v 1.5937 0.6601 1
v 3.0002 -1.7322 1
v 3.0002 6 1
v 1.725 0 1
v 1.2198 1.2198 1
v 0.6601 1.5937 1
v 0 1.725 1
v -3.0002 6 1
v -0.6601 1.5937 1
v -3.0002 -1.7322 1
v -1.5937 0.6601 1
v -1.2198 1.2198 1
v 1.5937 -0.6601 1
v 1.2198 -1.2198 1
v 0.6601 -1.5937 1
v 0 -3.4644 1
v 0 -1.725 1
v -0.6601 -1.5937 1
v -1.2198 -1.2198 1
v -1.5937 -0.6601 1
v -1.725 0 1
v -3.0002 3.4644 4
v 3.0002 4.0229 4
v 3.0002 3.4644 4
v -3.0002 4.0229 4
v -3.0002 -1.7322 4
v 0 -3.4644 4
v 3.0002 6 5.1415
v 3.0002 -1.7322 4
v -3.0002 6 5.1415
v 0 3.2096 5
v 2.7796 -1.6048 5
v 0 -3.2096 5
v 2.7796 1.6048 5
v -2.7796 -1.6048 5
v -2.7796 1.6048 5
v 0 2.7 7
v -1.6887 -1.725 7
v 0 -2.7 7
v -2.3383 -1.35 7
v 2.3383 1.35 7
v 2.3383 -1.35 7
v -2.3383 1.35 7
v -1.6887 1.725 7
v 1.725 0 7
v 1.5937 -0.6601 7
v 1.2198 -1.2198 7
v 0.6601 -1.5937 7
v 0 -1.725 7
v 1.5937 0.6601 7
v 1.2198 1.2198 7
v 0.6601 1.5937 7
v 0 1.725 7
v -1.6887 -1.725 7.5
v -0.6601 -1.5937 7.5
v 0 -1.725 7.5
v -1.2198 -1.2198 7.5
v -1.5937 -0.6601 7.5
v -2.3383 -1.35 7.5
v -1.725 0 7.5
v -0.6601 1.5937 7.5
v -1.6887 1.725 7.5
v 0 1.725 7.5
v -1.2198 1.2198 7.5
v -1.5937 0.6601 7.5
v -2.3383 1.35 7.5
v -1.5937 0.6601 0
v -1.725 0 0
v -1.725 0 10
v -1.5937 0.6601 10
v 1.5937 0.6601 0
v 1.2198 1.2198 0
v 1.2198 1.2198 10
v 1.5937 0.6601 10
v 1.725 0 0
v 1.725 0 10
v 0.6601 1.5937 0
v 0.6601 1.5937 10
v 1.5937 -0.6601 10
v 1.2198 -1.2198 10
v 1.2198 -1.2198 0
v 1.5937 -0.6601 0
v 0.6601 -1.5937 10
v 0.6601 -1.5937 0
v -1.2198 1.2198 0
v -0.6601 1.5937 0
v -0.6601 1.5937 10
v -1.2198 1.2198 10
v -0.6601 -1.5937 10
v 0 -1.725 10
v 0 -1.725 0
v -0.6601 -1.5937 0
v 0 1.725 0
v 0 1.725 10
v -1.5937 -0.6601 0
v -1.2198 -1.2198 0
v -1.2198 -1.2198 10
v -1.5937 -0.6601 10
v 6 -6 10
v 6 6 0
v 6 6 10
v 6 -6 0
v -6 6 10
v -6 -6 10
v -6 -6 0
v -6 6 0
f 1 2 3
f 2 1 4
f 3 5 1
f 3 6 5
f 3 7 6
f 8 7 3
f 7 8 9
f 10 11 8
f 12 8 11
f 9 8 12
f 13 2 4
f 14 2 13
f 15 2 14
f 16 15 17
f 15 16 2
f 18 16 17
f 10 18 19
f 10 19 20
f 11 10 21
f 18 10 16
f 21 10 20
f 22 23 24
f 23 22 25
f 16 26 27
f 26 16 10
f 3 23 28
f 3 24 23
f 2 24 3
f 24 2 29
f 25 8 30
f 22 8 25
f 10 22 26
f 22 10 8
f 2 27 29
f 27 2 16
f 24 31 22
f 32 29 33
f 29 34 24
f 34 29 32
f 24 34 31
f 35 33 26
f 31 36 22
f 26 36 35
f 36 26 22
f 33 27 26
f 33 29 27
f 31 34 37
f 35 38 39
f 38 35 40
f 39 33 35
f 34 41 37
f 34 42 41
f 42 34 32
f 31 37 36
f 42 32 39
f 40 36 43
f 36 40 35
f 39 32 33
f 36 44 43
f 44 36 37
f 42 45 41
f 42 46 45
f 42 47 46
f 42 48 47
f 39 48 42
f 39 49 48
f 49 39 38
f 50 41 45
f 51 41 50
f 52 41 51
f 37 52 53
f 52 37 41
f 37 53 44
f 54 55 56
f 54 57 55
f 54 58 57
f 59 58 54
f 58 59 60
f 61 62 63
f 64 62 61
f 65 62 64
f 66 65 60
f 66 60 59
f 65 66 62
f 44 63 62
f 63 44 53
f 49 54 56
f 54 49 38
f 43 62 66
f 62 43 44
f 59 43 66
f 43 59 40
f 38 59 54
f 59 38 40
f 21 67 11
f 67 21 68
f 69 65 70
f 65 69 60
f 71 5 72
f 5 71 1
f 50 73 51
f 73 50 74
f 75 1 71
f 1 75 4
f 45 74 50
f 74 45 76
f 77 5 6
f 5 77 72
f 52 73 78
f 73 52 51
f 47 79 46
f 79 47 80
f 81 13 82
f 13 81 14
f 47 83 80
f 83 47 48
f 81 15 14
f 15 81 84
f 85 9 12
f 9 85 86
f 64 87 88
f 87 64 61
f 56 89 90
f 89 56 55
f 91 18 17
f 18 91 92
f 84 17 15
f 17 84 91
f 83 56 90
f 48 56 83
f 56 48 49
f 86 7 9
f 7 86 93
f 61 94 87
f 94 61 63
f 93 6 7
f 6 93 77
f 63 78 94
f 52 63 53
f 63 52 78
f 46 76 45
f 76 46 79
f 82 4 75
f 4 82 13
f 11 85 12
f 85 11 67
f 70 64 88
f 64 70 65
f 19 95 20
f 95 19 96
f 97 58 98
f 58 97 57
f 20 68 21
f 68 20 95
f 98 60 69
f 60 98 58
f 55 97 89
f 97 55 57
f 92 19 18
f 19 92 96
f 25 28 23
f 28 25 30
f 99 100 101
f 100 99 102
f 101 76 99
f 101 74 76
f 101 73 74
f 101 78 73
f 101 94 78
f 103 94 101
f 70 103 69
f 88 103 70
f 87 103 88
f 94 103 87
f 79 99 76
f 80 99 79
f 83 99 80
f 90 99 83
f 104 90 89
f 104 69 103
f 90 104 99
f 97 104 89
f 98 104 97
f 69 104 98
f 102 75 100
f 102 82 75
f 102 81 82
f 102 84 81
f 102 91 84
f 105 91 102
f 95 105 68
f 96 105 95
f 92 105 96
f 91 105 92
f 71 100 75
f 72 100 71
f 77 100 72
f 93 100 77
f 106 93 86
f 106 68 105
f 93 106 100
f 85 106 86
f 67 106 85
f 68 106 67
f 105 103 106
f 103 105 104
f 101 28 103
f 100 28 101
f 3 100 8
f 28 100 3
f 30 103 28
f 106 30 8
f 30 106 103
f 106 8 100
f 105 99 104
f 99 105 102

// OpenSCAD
// file: ../libs/libdict.scad
// This library add dictionary like features to openscad
// the dictionary is a list of pairs as we cannot define new types.
// Unlike a python dictionary we cannot do a proper hash table for speed
// so everything is build around the OpenSCAD search function
// There are a lot of assert statements to ensure data in the "dictionary"
// is in the format of
// * A list of lists
// * Each internal list has a length of two
// * First element of each internal list is a string (the key)
// * All keys are unique.


// Private function:
// This function returns true if the value is in the list
// value must be a string.
// No error checking, for use by is_in only!
function _is_in_str(value, list) =
    search([value], list) != [[]];

// Private function:
// This function returns true if the value is in the list
// value must be a number.
// No error checking, for use by is_in only!
function _is_in_num(value, list) =
    search(value, list) != [];


// This function returns true if the value is in the list
// value must be a string or a number.
function is_in(value, list) =
    assert(is_num(value) || is_string(value) , "is_in: value must be a number or string")
    assert(is_list(list), "is_in: list must be a list")
    is_num(value) ? _is_in_num(value, list) : _is_in_str(value, list);

/**
 * Sum a list
 * This recursive function sums a list.  It should be called with one
 * argument (the list); the other two arguments simply allow it to be
 * "tail-recursive" which lets OpenSCAD optimise it better.  This is
 * very close to the example given in the OpenSCAD docs.
 */
function _libdict_sum_list(list, starting_element=0, running_total=0) =
    starting_element >= len(list) ?
        running_total :
        _libdict_sum_list(list, starting_element + 1, running_total + list[starting_element]);

/**
 * When checking a list for uniqueness, we can get "errant matches".
 * An errant match is when a non-list matches with the first element in a list.
 * i.e. it would consider [1, [1,0]] to be non-unique. We cannot know which 
 * element is the non-list but we do know that it is errant if exactly one 
 * of them is not a list.
 * If two elements are non-lists, they must be identical in order to have matched.  
 * Similarly, if all elements are lists, they must be identical because ``search`` 
 * will have matched them as whole lists.
 * The argument "list" is the list we are checking for uniqueness, and "match" is 
 * a vector of indices that have been returned by ``search``.
 */
function _check_errant_match(list, match) = let(
    non_list = [for (m = match) is_list(list[m])? 0 : 1],
    number_of_non_lists = _libdict_sum_list(non_list)
) number_of_non_lists == 1 ? 0 : 1;

// Returns true if all emements in list are unique.
function is_unique(list) =
    assert(is_list(list), "is_unique: list must be a list")
    let(
        matches = search(list, list, 0),
        // Assign 1 or 0 depending on is the match length for each element
        // return wether any matches are greater than one (mathcing more than
        // itself)
        // note cannot search for true or false so using 1 and zero
        bool_list = [for (match = matches) if (len(match)==1) 0
            // should put a 1 here to show they matched but in the case of
            // [1, [1]] it will match both, so need to check if they are
            // both lists or both not list
            else _check_errant_match(list, match)]
    ) !is_in(1, bool_list);

// Private function:
// Checks that the input is a list and that every element is a list
// of length 2.
// No error checking, for use by valid_dict only!
function _is_pairs(list) =
    !is_list(list) ? false :
        len(list)==0 ? false :
            !is_in(0, [for (pair = list) is_list(pair) && len(pair)==2 ? 1: 0]);

// Private function:
// Checks all elements in the list are strings
// No error checking, for use by valid_dict only!
// Strings can't be empty
function _is_list_of_strings(list) =
    !is_in(0, [for (item = list) is_string(item) && len(item)>0 ? 1: 0]);

// Private function:
// Returns the keus in a dictionary
// No error checking, for use by valid_dict only!
function _keylist(dict)  = [for (pair=dict) pair[0]];

function valid_dict(dict) =
    //if the input are not pairs return instantly
    !_is_pairs(dict) ? false : let (
        //if they are pairs get all keys
        keys = _keylist(dict),
        all_strings =  _is_list_of_strings(keys),
        unique = is_unique(keys)
    ) (all_strings && unique) ? true : false;

// Key lookup for key value pair "dictionary".
// Unlike the built in lookup this works with strings.
function key_lookup(key, dict) =
    assert(is_string(key), "`key` must be a string")
    assert(valid_dict(dict), "`dict` must be a valid 'dictionary'")
    let(
        // key is in [] because otherwise openscad will search for each letter rather than the string.
        index = search([key], dict, 1, 0)[0]
    )  assert (index!=[], "Key lookup failed, key not found!") dict[index][1];

// Creates a new dictionary with a key value pair replaced. Pair must already
// be in dictionary.
function replace_value(key, value, dict) =
    assert(is_string(key), "`key` must be a string")
    assert(valid_dict(dict), "`dict` must be a valid 'dictionary'")
    assert(is_in(key, _keylist(dict)), "`key` not found in dictionary!")
    [for (kv_pair = dict) key!=kv_pair[0] ? kv_pair : [key, value]];


// Creates a new dictionary with a a set of key value pair replaced
// both inputs must be a dictionary. All keys in input must already be
// in dictionary
function replace_multiple_values(rep_dict, dict) =
    assert(valid_dict(rep_dict), "`rep dict` must be a valid 'dictionary'")
    assert(valid_dict(dict), "`dict` must be a valid 'dictionary'")
    let(
        // loop over all keys in replacement dict checking they are in the original
        rep_keys = [for (key = _keylist(rep_dict))
            assert(is_in(key, _keylist(dict)), "`key` not found in dictionary!")
            key
        ]
    ) //Finally return the updated dictionary using this long list comprehension.
    [
        for (kv_pair = dict) let(
            key = kv_pair[0],
            // check if this key is in the replacement dictionary and if so return index
            // key is in [] because otherwise openscad will search for each letter rather
            // than the string.
            index = search([key], rep_dict, 1, 0)[0]
            // if index is empty return original key value pair, else return the key with
            // the replaced value
        ) index == [] ? kv_pair : [key, rep_dict[index][1]]
    ];
// main file
use <../libs/compact_nut_seat.scad>
use <../libs/utilities.scad>

nut_trap_test_object();

/**
* Simple test object to test the nut trap prints correctly
*/
module nut_trap_test_object(){
    cube_h = 10;
    extra_bore = 3;
    difference()
    {
        translate_z(cube_h/2){
            cube([12,12,cube_h], center=true);
        }
        m3_nut_trap_with_shaft(slot_angle=0,tilt=0,deep_shaft=extra_bore,chamfer_offset=4);
    }
}
